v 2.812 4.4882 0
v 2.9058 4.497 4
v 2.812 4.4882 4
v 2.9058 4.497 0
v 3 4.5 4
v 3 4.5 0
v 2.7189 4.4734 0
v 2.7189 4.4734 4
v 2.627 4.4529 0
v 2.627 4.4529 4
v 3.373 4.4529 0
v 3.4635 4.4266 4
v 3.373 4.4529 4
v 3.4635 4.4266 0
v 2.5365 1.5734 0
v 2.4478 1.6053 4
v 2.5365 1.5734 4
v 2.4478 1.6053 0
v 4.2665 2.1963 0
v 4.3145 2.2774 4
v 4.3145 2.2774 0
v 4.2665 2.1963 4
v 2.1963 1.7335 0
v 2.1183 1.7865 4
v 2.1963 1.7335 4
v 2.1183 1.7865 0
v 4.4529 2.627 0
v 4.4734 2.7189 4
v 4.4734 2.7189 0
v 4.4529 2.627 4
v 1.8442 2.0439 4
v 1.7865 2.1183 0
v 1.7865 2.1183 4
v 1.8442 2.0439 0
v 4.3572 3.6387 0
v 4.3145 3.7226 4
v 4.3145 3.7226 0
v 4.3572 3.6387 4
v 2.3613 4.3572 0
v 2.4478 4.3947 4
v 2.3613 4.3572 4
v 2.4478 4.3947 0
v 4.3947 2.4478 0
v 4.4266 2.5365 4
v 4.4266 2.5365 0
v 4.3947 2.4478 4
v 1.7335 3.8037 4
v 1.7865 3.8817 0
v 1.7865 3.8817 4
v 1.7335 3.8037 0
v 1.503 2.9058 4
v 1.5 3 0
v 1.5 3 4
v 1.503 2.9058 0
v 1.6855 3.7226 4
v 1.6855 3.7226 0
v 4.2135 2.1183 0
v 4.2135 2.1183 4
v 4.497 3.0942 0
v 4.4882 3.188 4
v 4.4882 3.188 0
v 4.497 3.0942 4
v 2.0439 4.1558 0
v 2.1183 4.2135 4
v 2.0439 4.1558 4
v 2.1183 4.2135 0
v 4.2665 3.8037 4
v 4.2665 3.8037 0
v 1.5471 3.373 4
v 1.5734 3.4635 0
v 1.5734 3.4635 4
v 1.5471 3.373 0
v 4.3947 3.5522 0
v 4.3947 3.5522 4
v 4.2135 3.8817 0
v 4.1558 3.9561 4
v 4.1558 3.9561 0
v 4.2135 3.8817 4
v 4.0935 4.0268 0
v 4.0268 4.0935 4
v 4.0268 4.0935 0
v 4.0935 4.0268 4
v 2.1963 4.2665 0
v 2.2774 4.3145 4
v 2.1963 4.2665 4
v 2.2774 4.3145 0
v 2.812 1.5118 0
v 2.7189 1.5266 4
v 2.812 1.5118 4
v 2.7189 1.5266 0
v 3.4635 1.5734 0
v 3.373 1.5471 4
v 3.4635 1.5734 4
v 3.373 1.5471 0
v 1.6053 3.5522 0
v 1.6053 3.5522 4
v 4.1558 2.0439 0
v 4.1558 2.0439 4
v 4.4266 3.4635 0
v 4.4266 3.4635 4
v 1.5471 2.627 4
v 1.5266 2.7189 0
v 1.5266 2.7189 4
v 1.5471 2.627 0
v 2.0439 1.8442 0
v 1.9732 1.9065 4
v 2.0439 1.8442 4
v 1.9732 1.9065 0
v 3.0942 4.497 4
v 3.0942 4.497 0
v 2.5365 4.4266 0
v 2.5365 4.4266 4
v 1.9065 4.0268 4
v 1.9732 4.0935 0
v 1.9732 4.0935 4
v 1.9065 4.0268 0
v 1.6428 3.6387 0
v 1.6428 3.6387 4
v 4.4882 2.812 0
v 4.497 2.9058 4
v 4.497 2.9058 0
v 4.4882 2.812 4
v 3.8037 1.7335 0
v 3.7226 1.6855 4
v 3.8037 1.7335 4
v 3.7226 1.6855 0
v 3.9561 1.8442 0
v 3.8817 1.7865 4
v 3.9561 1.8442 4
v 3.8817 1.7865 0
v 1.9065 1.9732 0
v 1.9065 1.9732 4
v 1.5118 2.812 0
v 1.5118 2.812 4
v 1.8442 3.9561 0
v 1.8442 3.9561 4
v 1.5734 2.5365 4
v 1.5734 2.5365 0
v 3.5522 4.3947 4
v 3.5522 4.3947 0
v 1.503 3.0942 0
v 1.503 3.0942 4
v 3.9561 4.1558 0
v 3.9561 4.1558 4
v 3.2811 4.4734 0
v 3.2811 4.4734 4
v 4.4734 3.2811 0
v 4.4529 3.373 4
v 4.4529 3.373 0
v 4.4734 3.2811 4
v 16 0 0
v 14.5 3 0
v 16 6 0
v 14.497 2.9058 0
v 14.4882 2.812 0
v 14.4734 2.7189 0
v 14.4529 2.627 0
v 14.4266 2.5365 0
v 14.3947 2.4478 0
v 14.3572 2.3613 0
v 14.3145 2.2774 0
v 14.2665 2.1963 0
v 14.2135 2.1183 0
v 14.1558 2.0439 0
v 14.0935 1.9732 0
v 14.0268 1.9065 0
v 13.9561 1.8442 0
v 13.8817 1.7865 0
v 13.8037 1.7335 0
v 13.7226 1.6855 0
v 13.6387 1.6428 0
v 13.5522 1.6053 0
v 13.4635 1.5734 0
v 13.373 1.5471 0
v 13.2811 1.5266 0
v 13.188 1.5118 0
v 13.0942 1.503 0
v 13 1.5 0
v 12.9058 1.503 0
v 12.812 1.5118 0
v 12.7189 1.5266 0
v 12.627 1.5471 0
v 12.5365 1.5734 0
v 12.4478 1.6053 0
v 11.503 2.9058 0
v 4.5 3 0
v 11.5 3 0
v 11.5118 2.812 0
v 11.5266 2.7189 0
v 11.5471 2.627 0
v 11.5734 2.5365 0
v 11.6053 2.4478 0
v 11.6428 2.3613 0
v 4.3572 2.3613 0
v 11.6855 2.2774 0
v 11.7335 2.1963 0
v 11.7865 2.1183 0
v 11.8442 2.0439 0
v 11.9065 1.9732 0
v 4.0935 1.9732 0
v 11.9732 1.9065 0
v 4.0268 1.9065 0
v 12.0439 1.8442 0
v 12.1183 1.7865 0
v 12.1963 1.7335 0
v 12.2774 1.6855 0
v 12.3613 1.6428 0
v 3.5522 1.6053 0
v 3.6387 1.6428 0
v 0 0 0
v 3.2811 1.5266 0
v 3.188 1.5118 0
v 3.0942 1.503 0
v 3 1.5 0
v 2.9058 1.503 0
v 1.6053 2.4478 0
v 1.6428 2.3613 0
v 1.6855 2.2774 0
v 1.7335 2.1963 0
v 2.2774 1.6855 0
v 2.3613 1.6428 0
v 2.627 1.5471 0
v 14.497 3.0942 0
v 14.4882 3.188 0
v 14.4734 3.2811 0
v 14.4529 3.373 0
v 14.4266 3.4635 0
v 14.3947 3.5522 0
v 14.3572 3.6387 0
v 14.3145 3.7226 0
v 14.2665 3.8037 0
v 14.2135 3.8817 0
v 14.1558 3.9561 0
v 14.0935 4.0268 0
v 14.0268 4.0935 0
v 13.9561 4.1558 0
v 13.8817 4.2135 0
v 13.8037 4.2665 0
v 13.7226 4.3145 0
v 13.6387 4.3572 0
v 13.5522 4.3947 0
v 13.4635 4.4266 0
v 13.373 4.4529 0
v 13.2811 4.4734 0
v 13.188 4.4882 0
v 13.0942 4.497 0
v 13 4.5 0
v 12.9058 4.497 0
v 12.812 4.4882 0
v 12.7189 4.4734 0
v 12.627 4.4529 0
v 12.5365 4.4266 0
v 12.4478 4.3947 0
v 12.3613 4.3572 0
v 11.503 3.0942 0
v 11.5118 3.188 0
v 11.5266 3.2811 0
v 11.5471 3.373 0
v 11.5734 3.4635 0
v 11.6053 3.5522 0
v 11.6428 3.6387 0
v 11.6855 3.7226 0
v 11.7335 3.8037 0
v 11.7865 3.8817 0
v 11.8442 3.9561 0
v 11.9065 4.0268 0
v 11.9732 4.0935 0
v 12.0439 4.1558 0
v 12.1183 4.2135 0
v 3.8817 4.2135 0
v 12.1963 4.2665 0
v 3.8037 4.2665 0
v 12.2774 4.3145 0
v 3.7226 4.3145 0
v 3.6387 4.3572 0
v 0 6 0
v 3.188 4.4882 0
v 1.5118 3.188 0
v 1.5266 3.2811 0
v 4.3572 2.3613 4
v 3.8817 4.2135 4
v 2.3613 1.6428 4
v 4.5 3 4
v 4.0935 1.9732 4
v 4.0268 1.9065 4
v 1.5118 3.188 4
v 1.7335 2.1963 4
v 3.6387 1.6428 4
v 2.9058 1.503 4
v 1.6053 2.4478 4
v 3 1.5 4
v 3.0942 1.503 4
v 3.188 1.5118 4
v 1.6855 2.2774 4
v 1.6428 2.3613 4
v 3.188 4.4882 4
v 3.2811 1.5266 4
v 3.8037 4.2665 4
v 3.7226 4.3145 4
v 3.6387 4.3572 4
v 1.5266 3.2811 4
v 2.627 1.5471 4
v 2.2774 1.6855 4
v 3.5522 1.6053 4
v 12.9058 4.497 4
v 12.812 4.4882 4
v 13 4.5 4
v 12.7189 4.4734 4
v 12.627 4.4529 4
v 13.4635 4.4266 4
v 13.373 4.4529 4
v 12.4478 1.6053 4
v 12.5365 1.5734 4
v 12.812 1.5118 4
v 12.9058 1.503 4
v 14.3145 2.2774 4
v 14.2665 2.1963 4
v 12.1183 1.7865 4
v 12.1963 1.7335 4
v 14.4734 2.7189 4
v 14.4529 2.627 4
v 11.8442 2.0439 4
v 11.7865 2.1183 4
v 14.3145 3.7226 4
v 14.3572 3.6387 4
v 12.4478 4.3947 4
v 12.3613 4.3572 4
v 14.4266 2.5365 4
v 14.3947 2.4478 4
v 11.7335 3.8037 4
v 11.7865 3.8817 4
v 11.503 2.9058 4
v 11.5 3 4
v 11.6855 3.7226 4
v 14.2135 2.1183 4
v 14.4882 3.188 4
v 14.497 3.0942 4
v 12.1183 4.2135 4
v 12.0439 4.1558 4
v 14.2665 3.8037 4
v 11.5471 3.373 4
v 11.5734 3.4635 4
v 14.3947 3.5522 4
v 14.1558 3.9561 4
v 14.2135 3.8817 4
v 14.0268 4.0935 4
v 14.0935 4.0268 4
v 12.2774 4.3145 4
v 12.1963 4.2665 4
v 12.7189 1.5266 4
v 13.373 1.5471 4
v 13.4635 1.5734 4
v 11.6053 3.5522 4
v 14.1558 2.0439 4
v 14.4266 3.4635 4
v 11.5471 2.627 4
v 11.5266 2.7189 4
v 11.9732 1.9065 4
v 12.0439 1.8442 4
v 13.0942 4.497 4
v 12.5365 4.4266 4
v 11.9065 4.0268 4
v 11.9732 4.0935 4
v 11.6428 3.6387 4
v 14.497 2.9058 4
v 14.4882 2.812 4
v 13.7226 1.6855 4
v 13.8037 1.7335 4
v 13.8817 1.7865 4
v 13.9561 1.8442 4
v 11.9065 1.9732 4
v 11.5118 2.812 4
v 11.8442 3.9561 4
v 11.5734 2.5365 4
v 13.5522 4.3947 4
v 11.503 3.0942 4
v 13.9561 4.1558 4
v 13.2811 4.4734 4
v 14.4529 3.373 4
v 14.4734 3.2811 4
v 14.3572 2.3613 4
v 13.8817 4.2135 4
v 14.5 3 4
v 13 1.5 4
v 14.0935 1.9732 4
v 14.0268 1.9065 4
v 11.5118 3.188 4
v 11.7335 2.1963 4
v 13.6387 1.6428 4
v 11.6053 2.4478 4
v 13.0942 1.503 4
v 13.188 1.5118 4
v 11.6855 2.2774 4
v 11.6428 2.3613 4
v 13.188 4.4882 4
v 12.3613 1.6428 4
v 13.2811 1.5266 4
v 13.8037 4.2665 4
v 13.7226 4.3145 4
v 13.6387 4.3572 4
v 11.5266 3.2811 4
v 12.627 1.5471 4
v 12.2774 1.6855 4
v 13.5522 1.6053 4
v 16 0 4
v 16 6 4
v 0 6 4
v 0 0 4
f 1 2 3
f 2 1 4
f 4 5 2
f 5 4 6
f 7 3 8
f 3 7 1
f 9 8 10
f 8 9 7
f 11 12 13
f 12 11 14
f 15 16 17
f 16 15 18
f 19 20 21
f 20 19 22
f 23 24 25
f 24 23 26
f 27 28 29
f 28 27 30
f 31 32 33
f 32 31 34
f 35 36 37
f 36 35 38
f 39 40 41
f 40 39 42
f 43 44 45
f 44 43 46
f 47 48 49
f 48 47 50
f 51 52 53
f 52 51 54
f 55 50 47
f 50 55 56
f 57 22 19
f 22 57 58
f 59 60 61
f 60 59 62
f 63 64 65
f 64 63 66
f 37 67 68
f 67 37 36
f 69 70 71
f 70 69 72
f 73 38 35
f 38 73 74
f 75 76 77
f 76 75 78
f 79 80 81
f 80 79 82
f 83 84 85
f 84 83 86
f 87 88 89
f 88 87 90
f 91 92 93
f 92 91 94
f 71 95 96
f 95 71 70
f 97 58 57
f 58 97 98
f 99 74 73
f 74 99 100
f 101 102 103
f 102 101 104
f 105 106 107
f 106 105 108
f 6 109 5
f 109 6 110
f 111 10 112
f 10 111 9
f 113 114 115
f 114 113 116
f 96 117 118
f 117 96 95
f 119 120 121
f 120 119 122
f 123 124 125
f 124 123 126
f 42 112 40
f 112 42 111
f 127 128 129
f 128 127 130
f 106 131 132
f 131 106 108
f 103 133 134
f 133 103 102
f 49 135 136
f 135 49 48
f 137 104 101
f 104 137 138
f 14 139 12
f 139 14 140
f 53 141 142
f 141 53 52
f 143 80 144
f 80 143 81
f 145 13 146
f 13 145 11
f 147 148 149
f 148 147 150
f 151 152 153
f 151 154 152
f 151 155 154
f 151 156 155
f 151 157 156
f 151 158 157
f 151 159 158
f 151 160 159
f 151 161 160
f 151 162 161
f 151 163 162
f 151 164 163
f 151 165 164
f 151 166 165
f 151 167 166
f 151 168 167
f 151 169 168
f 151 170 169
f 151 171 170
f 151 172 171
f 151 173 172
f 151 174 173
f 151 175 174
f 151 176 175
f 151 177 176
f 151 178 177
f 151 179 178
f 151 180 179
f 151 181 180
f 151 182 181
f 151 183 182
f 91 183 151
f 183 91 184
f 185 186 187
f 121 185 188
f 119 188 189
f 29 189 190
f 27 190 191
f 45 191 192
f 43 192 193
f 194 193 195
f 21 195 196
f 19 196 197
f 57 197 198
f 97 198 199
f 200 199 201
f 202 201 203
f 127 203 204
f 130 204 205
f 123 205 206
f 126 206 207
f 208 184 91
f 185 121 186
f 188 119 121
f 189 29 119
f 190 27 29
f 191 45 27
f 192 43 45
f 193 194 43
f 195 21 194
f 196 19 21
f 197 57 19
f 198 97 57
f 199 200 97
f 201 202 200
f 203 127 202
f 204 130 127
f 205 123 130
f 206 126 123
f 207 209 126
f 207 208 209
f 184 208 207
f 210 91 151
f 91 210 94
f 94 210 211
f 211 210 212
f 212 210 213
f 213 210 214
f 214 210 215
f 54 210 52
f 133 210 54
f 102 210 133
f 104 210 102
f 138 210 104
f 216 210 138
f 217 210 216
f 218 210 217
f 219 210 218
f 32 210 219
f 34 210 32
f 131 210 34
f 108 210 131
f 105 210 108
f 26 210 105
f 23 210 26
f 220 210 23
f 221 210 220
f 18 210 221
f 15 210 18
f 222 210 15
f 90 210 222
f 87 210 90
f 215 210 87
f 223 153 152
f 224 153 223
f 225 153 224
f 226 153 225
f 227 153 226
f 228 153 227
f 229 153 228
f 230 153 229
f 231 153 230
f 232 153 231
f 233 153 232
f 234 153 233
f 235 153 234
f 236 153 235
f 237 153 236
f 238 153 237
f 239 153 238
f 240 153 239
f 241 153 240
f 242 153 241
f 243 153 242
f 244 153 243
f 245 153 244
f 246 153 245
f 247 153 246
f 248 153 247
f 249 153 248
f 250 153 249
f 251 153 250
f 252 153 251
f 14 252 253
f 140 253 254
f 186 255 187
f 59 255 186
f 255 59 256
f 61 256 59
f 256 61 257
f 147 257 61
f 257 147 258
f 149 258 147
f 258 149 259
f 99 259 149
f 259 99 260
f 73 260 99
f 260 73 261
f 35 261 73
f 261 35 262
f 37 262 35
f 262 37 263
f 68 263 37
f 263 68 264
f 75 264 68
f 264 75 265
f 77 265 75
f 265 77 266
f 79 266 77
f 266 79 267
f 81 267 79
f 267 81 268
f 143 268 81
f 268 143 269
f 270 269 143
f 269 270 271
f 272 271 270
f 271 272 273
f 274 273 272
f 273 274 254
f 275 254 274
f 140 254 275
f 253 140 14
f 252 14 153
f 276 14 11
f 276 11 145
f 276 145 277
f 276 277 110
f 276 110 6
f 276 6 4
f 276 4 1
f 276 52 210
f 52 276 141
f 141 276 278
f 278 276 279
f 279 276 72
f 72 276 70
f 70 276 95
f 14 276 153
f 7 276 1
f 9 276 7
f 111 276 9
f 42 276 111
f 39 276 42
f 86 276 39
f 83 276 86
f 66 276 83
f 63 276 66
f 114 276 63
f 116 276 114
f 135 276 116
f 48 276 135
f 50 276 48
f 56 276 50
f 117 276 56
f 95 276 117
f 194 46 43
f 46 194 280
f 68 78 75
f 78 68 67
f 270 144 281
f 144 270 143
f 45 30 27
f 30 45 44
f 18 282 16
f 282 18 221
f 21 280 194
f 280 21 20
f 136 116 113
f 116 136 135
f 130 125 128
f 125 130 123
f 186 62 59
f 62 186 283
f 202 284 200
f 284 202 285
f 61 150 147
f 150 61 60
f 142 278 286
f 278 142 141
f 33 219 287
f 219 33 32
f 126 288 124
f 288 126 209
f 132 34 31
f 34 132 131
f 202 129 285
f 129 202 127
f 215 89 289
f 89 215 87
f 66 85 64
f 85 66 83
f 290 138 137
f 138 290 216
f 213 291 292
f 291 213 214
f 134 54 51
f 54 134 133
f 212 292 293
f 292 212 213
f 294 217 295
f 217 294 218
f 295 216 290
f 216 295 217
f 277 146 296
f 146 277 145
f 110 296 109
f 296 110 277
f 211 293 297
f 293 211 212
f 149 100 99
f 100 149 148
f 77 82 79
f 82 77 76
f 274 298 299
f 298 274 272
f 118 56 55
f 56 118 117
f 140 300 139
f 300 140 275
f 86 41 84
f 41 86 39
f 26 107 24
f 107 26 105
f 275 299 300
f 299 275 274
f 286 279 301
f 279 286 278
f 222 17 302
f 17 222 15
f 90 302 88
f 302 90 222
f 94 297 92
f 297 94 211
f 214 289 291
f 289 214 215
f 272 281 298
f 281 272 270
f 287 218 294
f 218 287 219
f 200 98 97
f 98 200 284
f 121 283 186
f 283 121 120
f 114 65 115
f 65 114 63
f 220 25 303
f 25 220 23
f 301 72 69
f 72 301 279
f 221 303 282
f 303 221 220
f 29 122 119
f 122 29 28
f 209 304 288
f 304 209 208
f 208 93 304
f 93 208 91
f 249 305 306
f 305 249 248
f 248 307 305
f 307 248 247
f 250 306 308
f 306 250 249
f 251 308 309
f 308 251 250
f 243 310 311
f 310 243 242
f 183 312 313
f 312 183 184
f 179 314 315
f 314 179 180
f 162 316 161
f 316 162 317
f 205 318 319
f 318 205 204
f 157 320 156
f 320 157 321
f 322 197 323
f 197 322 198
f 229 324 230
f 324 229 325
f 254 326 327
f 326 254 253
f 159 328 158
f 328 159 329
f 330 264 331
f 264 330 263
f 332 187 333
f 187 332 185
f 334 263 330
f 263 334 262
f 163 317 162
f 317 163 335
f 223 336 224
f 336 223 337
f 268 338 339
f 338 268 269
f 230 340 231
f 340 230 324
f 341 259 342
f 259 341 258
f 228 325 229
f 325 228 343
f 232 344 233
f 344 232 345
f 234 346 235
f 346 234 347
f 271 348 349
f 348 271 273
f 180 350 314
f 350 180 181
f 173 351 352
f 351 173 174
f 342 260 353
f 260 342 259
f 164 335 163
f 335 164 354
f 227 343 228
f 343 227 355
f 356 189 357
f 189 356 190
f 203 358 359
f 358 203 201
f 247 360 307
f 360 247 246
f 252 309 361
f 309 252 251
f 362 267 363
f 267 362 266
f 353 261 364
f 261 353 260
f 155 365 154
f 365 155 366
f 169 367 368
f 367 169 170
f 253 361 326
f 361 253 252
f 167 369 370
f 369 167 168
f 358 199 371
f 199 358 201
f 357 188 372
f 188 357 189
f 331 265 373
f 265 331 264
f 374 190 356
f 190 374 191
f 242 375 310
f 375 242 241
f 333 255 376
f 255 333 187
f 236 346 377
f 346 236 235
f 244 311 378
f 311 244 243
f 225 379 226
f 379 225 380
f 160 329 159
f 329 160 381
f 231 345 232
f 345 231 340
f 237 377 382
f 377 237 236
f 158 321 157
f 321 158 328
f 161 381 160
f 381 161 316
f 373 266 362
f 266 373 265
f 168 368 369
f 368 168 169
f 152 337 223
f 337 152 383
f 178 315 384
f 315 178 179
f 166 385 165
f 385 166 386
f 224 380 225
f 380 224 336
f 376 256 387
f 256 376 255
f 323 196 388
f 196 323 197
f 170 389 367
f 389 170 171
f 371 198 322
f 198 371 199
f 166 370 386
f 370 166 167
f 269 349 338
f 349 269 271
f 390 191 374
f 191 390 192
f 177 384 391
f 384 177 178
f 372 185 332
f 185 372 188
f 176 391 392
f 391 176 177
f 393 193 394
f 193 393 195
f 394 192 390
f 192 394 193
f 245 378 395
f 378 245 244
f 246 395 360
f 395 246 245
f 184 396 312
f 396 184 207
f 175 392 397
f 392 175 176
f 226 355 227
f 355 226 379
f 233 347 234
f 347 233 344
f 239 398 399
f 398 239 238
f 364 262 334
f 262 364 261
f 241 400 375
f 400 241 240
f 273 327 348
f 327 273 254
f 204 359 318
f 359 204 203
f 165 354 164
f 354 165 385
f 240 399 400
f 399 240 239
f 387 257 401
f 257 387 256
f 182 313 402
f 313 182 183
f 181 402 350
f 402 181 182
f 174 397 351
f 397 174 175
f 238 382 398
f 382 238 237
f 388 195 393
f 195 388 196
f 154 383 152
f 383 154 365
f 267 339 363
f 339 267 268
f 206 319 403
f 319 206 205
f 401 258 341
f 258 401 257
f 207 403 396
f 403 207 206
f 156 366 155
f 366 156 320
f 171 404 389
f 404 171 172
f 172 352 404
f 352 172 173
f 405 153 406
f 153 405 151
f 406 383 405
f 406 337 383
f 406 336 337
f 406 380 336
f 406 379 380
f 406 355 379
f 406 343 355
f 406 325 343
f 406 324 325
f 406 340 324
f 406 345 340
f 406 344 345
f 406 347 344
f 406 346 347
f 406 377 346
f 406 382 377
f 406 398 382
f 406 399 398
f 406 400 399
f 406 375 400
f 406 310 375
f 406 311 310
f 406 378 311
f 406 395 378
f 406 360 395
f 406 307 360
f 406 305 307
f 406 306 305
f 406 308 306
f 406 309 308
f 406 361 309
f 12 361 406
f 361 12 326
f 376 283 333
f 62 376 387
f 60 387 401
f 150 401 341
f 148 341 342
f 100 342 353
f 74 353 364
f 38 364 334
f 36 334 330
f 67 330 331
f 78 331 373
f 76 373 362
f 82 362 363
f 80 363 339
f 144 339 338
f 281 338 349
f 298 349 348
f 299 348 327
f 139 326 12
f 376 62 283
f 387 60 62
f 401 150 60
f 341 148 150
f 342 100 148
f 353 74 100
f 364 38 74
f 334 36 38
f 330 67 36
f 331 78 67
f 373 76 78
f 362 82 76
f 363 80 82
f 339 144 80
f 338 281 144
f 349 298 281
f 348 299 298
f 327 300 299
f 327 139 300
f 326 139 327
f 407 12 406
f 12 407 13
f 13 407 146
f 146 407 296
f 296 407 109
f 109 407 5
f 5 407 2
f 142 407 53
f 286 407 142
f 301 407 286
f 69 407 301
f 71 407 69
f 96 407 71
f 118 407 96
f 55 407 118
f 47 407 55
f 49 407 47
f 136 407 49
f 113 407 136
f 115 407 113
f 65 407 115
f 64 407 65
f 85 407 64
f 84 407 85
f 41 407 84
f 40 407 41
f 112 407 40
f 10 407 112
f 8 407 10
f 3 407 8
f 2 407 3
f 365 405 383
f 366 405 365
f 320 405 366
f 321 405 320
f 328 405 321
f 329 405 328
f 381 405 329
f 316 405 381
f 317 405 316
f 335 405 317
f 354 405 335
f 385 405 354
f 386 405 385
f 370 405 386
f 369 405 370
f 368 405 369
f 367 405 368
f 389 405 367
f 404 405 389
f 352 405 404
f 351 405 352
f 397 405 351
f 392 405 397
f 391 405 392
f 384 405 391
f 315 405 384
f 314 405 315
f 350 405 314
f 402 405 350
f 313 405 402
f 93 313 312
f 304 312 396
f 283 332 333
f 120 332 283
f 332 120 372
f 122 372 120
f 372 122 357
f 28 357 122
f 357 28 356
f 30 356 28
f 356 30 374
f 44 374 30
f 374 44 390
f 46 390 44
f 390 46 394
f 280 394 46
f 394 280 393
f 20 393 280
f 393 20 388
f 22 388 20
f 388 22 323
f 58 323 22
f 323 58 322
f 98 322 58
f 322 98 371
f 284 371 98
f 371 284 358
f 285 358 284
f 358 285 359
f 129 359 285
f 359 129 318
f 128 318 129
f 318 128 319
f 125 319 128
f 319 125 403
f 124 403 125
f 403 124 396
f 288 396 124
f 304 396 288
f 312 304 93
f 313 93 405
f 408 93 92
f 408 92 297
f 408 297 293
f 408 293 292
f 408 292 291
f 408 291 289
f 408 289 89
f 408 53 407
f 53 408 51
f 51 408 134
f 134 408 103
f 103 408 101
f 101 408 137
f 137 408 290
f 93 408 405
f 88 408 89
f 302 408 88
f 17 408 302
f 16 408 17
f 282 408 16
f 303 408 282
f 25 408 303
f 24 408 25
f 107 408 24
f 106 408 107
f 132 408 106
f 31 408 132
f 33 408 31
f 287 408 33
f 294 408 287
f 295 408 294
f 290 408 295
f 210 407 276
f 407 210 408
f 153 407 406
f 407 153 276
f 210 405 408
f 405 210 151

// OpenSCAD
difference(){
	union(){

        translate([0,0,0]){
            cube([16,6,4], center=false);
        }

        

	}
	union() {

        translate([3,3,0]){
            rotate([0,0,90]){
                cylinder(h=200, r=1.5, $fn=100, center=false);
            }
        }
        translate([13,3,0]){
            rotate([0,0,90]){
                cylinder(h=200, r=1.5, $fn=100, center=false);
            }
        }


	}
}
